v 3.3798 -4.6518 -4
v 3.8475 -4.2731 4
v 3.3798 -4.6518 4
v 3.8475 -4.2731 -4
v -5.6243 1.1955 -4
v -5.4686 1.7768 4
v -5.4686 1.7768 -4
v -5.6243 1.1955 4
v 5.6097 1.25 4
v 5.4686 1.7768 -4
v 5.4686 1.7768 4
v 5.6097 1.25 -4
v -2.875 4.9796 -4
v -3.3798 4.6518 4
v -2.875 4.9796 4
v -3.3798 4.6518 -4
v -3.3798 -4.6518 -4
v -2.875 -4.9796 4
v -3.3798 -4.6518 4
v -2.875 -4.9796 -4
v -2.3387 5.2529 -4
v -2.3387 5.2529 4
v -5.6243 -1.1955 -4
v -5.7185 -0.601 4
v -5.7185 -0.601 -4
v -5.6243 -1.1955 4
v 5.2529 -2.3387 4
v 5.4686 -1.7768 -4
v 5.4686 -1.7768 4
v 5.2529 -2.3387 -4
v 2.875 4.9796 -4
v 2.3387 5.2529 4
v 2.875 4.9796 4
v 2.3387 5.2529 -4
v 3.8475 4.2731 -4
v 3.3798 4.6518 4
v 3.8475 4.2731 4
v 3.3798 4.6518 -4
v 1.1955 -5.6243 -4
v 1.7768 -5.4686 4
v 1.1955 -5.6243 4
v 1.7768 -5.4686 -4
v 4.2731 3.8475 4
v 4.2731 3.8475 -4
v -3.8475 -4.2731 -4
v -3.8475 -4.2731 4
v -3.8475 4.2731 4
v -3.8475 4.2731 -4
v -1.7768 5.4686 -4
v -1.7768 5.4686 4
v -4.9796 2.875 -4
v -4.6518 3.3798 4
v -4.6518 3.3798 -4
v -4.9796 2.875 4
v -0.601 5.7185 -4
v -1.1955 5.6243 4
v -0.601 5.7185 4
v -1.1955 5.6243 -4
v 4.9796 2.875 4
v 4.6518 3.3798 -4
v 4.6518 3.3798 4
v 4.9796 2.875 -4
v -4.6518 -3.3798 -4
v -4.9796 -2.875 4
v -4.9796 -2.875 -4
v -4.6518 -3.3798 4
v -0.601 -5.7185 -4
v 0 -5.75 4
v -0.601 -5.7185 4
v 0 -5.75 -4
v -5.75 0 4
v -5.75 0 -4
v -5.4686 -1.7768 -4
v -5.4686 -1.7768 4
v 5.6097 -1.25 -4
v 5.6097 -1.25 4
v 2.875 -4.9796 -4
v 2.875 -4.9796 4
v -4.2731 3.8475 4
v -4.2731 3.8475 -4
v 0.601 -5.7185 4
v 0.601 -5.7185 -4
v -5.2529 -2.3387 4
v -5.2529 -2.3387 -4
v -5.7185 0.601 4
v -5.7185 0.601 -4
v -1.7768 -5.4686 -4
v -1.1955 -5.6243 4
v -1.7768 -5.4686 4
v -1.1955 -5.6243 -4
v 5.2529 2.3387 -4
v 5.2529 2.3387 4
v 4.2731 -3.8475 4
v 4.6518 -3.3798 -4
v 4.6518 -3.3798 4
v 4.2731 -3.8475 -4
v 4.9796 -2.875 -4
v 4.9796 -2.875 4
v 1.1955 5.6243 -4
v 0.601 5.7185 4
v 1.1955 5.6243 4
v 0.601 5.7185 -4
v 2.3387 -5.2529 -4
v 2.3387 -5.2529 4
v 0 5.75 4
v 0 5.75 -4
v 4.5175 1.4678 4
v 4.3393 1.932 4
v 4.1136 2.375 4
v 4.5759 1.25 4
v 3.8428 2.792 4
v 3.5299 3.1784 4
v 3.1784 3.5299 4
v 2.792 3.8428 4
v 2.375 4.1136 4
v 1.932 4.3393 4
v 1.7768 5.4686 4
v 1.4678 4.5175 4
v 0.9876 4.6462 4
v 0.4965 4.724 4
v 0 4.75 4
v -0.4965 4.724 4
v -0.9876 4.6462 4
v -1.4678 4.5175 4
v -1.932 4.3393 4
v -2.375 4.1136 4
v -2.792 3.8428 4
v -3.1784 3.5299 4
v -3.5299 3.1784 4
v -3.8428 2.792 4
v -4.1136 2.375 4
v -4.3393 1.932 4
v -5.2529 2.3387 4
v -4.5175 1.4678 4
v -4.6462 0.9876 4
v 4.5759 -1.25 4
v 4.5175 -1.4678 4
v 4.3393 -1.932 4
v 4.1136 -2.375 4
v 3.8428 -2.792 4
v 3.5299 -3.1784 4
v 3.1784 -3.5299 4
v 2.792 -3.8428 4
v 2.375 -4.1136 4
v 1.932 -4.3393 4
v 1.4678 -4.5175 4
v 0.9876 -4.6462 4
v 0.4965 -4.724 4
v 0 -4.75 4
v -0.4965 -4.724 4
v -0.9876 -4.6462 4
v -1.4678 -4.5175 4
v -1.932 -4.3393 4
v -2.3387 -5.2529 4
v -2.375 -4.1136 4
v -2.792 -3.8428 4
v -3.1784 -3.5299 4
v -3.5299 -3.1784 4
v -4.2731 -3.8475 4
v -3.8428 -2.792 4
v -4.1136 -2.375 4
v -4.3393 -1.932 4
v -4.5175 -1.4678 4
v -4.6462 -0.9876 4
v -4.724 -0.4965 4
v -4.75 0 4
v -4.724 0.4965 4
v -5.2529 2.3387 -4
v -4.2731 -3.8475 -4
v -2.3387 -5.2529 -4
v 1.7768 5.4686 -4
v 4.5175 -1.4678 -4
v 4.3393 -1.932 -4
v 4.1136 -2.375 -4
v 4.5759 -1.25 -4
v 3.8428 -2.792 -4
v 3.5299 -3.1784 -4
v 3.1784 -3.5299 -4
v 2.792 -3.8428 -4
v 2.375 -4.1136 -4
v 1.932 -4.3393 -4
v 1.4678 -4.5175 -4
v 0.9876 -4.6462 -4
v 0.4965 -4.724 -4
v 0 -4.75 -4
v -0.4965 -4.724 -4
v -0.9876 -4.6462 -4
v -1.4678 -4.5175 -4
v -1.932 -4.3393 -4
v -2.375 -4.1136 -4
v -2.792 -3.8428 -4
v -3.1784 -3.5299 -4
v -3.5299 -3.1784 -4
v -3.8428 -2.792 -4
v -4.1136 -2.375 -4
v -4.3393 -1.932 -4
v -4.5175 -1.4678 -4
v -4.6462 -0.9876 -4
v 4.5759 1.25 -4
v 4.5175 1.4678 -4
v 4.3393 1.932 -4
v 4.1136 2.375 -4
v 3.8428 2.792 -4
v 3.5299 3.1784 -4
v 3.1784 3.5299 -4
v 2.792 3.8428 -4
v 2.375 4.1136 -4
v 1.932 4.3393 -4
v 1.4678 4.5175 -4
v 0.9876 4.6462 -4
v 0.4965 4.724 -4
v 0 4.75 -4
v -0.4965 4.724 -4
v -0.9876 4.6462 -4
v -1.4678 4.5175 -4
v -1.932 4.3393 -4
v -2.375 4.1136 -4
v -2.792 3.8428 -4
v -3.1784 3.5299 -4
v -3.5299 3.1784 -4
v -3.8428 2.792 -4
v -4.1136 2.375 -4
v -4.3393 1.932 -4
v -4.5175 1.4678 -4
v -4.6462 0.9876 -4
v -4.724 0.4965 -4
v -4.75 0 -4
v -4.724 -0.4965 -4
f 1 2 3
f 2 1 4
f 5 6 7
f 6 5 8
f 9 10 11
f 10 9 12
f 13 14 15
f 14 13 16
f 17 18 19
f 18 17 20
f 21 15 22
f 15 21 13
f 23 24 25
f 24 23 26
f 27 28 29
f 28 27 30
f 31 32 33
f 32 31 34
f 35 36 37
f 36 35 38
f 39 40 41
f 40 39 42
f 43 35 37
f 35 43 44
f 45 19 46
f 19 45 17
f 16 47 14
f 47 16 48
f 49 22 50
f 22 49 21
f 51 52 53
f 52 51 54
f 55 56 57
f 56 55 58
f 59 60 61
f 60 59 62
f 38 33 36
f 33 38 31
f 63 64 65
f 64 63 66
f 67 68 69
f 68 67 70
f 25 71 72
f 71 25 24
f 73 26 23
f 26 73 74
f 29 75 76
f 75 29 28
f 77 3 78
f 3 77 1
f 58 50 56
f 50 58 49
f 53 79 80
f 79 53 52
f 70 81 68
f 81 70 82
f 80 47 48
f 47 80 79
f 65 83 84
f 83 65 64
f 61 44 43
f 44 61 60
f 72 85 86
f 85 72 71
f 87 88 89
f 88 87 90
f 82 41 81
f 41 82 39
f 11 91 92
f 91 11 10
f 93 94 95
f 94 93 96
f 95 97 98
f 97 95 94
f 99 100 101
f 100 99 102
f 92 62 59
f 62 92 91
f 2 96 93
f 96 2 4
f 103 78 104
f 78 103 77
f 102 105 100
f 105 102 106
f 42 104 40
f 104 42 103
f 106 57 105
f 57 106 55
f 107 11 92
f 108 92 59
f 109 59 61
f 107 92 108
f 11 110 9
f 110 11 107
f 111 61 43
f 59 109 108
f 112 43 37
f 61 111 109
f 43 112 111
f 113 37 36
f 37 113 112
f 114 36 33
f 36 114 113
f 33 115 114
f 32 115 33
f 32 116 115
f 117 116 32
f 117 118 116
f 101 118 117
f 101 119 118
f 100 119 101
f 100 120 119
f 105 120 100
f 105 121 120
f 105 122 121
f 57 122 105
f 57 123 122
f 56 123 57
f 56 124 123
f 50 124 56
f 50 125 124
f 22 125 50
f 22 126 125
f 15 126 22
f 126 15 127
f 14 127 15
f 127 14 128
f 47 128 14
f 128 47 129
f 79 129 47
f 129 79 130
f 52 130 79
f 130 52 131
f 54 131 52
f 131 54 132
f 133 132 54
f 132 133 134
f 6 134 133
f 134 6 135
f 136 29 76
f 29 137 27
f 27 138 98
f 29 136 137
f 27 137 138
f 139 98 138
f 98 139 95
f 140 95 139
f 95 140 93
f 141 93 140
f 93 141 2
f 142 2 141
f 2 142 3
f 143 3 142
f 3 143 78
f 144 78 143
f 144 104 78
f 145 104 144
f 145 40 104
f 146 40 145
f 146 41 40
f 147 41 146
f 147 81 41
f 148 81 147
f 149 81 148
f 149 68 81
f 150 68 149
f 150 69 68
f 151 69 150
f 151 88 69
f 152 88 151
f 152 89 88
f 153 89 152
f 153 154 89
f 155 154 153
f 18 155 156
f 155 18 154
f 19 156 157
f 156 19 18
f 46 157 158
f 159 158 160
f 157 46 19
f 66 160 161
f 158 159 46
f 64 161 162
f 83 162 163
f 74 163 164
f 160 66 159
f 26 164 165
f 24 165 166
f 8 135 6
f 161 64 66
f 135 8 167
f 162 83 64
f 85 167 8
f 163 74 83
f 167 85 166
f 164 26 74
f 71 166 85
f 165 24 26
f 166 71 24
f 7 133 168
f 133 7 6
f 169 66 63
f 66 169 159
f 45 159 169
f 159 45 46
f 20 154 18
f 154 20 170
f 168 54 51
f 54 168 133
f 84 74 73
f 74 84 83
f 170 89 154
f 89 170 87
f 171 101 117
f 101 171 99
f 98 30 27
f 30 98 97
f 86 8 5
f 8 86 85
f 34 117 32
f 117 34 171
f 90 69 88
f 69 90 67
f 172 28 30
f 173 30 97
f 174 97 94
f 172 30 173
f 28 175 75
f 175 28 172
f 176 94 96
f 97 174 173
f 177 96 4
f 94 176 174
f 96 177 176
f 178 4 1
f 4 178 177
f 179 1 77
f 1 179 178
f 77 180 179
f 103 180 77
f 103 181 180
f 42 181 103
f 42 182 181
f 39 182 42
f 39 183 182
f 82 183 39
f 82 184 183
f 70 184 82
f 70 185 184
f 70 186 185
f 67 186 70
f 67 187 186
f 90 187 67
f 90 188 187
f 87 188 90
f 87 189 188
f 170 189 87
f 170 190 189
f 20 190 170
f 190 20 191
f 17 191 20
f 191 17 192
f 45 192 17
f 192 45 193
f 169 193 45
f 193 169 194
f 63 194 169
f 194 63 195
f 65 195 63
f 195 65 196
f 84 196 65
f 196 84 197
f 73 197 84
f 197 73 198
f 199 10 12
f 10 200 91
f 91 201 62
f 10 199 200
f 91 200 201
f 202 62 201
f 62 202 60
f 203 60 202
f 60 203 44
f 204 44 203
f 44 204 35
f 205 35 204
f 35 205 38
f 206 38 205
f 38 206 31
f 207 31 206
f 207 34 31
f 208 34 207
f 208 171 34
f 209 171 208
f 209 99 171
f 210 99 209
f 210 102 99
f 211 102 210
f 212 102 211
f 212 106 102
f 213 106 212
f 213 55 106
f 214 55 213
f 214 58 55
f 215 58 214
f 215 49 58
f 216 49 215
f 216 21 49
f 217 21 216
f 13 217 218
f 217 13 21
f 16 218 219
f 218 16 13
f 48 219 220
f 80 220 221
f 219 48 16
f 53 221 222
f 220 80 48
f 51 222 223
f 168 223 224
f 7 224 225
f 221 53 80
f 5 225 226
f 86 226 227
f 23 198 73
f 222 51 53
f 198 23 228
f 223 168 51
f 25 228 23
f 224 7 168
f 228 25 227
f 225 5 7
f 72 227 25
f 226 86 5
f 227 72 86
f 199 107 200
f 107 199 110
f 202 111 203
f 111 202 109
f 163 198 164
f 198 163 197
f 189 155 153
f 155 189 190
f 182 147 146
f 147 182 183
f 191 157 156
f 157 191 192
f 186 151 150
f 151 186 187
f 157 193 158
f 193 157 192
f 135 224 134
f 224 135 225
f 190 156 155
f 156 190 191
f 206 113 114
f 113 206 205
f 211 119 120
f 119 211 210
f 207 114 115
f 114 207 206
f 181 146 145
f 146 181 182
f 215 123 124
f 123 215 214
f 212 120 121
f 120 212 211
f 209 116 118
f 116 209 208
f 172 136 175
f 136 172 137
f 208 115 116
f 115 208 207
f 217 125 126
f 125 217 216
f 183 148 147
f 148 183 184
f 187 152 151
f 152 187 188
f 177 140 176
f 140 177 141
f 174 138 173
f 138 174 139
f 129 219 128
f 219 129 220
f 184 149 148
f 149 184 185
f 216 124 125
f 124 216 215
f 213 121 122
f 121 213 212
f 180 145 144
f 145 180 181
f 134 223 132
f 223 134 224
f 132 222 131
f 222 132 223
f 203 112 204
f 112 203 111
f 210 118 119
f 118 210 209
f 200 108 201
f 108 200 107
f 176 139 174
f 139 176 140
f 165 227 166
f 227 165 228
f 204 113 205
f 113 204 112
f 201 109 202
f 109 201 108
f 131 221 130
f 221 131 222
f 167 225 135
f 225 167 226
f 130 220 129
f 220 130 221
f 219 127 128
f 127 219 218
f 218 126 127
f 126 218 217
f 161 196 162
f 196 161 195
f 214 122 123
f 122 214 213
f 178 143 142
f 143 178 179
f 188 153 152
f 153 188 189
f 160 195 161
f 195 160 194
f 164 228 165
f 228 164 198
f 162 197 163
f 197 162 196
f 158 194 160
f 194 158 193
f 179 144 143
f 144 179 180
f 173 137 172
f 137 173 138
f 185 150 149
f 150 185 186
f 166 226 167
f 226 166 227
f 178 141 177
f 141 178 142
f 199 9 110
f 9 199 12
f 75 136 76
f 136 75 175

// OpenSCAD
/*
*   ESPotifyEcho spareCubeBase
*   22-08-2022
*/

$fn=60;

module cubeBase()
{
  difference()
  {
    cube([59,59,3], true);
    translate([0,0,0.7])      cube([57,57,3], true);
    translate([27.2,17.5,-3]) color("red") cube([9,10,10]);
    translate([-36.2,17.5,-3])  color("red") cube([9,10,10]);
  }
} //  cubeBase()


module tubeExt1()
{
  difference()
  {
    cylinder(h=10, d=11.5, center=true);
    cylinder(h=11, d=9.5, center=true);
  }
} //  tubeExt1()

module tubeExt2()
{
  difference()
  {
    cylinder(h=8, d=11.5, center=true);
    cylinder(h=9, d=9.5, center=true);
    translate([7,0,0]) cube([8,2.5,9], true);
  }
} //  tubeExt2()


//cubeBase();

//tubeExt1();
tubeExt2();
